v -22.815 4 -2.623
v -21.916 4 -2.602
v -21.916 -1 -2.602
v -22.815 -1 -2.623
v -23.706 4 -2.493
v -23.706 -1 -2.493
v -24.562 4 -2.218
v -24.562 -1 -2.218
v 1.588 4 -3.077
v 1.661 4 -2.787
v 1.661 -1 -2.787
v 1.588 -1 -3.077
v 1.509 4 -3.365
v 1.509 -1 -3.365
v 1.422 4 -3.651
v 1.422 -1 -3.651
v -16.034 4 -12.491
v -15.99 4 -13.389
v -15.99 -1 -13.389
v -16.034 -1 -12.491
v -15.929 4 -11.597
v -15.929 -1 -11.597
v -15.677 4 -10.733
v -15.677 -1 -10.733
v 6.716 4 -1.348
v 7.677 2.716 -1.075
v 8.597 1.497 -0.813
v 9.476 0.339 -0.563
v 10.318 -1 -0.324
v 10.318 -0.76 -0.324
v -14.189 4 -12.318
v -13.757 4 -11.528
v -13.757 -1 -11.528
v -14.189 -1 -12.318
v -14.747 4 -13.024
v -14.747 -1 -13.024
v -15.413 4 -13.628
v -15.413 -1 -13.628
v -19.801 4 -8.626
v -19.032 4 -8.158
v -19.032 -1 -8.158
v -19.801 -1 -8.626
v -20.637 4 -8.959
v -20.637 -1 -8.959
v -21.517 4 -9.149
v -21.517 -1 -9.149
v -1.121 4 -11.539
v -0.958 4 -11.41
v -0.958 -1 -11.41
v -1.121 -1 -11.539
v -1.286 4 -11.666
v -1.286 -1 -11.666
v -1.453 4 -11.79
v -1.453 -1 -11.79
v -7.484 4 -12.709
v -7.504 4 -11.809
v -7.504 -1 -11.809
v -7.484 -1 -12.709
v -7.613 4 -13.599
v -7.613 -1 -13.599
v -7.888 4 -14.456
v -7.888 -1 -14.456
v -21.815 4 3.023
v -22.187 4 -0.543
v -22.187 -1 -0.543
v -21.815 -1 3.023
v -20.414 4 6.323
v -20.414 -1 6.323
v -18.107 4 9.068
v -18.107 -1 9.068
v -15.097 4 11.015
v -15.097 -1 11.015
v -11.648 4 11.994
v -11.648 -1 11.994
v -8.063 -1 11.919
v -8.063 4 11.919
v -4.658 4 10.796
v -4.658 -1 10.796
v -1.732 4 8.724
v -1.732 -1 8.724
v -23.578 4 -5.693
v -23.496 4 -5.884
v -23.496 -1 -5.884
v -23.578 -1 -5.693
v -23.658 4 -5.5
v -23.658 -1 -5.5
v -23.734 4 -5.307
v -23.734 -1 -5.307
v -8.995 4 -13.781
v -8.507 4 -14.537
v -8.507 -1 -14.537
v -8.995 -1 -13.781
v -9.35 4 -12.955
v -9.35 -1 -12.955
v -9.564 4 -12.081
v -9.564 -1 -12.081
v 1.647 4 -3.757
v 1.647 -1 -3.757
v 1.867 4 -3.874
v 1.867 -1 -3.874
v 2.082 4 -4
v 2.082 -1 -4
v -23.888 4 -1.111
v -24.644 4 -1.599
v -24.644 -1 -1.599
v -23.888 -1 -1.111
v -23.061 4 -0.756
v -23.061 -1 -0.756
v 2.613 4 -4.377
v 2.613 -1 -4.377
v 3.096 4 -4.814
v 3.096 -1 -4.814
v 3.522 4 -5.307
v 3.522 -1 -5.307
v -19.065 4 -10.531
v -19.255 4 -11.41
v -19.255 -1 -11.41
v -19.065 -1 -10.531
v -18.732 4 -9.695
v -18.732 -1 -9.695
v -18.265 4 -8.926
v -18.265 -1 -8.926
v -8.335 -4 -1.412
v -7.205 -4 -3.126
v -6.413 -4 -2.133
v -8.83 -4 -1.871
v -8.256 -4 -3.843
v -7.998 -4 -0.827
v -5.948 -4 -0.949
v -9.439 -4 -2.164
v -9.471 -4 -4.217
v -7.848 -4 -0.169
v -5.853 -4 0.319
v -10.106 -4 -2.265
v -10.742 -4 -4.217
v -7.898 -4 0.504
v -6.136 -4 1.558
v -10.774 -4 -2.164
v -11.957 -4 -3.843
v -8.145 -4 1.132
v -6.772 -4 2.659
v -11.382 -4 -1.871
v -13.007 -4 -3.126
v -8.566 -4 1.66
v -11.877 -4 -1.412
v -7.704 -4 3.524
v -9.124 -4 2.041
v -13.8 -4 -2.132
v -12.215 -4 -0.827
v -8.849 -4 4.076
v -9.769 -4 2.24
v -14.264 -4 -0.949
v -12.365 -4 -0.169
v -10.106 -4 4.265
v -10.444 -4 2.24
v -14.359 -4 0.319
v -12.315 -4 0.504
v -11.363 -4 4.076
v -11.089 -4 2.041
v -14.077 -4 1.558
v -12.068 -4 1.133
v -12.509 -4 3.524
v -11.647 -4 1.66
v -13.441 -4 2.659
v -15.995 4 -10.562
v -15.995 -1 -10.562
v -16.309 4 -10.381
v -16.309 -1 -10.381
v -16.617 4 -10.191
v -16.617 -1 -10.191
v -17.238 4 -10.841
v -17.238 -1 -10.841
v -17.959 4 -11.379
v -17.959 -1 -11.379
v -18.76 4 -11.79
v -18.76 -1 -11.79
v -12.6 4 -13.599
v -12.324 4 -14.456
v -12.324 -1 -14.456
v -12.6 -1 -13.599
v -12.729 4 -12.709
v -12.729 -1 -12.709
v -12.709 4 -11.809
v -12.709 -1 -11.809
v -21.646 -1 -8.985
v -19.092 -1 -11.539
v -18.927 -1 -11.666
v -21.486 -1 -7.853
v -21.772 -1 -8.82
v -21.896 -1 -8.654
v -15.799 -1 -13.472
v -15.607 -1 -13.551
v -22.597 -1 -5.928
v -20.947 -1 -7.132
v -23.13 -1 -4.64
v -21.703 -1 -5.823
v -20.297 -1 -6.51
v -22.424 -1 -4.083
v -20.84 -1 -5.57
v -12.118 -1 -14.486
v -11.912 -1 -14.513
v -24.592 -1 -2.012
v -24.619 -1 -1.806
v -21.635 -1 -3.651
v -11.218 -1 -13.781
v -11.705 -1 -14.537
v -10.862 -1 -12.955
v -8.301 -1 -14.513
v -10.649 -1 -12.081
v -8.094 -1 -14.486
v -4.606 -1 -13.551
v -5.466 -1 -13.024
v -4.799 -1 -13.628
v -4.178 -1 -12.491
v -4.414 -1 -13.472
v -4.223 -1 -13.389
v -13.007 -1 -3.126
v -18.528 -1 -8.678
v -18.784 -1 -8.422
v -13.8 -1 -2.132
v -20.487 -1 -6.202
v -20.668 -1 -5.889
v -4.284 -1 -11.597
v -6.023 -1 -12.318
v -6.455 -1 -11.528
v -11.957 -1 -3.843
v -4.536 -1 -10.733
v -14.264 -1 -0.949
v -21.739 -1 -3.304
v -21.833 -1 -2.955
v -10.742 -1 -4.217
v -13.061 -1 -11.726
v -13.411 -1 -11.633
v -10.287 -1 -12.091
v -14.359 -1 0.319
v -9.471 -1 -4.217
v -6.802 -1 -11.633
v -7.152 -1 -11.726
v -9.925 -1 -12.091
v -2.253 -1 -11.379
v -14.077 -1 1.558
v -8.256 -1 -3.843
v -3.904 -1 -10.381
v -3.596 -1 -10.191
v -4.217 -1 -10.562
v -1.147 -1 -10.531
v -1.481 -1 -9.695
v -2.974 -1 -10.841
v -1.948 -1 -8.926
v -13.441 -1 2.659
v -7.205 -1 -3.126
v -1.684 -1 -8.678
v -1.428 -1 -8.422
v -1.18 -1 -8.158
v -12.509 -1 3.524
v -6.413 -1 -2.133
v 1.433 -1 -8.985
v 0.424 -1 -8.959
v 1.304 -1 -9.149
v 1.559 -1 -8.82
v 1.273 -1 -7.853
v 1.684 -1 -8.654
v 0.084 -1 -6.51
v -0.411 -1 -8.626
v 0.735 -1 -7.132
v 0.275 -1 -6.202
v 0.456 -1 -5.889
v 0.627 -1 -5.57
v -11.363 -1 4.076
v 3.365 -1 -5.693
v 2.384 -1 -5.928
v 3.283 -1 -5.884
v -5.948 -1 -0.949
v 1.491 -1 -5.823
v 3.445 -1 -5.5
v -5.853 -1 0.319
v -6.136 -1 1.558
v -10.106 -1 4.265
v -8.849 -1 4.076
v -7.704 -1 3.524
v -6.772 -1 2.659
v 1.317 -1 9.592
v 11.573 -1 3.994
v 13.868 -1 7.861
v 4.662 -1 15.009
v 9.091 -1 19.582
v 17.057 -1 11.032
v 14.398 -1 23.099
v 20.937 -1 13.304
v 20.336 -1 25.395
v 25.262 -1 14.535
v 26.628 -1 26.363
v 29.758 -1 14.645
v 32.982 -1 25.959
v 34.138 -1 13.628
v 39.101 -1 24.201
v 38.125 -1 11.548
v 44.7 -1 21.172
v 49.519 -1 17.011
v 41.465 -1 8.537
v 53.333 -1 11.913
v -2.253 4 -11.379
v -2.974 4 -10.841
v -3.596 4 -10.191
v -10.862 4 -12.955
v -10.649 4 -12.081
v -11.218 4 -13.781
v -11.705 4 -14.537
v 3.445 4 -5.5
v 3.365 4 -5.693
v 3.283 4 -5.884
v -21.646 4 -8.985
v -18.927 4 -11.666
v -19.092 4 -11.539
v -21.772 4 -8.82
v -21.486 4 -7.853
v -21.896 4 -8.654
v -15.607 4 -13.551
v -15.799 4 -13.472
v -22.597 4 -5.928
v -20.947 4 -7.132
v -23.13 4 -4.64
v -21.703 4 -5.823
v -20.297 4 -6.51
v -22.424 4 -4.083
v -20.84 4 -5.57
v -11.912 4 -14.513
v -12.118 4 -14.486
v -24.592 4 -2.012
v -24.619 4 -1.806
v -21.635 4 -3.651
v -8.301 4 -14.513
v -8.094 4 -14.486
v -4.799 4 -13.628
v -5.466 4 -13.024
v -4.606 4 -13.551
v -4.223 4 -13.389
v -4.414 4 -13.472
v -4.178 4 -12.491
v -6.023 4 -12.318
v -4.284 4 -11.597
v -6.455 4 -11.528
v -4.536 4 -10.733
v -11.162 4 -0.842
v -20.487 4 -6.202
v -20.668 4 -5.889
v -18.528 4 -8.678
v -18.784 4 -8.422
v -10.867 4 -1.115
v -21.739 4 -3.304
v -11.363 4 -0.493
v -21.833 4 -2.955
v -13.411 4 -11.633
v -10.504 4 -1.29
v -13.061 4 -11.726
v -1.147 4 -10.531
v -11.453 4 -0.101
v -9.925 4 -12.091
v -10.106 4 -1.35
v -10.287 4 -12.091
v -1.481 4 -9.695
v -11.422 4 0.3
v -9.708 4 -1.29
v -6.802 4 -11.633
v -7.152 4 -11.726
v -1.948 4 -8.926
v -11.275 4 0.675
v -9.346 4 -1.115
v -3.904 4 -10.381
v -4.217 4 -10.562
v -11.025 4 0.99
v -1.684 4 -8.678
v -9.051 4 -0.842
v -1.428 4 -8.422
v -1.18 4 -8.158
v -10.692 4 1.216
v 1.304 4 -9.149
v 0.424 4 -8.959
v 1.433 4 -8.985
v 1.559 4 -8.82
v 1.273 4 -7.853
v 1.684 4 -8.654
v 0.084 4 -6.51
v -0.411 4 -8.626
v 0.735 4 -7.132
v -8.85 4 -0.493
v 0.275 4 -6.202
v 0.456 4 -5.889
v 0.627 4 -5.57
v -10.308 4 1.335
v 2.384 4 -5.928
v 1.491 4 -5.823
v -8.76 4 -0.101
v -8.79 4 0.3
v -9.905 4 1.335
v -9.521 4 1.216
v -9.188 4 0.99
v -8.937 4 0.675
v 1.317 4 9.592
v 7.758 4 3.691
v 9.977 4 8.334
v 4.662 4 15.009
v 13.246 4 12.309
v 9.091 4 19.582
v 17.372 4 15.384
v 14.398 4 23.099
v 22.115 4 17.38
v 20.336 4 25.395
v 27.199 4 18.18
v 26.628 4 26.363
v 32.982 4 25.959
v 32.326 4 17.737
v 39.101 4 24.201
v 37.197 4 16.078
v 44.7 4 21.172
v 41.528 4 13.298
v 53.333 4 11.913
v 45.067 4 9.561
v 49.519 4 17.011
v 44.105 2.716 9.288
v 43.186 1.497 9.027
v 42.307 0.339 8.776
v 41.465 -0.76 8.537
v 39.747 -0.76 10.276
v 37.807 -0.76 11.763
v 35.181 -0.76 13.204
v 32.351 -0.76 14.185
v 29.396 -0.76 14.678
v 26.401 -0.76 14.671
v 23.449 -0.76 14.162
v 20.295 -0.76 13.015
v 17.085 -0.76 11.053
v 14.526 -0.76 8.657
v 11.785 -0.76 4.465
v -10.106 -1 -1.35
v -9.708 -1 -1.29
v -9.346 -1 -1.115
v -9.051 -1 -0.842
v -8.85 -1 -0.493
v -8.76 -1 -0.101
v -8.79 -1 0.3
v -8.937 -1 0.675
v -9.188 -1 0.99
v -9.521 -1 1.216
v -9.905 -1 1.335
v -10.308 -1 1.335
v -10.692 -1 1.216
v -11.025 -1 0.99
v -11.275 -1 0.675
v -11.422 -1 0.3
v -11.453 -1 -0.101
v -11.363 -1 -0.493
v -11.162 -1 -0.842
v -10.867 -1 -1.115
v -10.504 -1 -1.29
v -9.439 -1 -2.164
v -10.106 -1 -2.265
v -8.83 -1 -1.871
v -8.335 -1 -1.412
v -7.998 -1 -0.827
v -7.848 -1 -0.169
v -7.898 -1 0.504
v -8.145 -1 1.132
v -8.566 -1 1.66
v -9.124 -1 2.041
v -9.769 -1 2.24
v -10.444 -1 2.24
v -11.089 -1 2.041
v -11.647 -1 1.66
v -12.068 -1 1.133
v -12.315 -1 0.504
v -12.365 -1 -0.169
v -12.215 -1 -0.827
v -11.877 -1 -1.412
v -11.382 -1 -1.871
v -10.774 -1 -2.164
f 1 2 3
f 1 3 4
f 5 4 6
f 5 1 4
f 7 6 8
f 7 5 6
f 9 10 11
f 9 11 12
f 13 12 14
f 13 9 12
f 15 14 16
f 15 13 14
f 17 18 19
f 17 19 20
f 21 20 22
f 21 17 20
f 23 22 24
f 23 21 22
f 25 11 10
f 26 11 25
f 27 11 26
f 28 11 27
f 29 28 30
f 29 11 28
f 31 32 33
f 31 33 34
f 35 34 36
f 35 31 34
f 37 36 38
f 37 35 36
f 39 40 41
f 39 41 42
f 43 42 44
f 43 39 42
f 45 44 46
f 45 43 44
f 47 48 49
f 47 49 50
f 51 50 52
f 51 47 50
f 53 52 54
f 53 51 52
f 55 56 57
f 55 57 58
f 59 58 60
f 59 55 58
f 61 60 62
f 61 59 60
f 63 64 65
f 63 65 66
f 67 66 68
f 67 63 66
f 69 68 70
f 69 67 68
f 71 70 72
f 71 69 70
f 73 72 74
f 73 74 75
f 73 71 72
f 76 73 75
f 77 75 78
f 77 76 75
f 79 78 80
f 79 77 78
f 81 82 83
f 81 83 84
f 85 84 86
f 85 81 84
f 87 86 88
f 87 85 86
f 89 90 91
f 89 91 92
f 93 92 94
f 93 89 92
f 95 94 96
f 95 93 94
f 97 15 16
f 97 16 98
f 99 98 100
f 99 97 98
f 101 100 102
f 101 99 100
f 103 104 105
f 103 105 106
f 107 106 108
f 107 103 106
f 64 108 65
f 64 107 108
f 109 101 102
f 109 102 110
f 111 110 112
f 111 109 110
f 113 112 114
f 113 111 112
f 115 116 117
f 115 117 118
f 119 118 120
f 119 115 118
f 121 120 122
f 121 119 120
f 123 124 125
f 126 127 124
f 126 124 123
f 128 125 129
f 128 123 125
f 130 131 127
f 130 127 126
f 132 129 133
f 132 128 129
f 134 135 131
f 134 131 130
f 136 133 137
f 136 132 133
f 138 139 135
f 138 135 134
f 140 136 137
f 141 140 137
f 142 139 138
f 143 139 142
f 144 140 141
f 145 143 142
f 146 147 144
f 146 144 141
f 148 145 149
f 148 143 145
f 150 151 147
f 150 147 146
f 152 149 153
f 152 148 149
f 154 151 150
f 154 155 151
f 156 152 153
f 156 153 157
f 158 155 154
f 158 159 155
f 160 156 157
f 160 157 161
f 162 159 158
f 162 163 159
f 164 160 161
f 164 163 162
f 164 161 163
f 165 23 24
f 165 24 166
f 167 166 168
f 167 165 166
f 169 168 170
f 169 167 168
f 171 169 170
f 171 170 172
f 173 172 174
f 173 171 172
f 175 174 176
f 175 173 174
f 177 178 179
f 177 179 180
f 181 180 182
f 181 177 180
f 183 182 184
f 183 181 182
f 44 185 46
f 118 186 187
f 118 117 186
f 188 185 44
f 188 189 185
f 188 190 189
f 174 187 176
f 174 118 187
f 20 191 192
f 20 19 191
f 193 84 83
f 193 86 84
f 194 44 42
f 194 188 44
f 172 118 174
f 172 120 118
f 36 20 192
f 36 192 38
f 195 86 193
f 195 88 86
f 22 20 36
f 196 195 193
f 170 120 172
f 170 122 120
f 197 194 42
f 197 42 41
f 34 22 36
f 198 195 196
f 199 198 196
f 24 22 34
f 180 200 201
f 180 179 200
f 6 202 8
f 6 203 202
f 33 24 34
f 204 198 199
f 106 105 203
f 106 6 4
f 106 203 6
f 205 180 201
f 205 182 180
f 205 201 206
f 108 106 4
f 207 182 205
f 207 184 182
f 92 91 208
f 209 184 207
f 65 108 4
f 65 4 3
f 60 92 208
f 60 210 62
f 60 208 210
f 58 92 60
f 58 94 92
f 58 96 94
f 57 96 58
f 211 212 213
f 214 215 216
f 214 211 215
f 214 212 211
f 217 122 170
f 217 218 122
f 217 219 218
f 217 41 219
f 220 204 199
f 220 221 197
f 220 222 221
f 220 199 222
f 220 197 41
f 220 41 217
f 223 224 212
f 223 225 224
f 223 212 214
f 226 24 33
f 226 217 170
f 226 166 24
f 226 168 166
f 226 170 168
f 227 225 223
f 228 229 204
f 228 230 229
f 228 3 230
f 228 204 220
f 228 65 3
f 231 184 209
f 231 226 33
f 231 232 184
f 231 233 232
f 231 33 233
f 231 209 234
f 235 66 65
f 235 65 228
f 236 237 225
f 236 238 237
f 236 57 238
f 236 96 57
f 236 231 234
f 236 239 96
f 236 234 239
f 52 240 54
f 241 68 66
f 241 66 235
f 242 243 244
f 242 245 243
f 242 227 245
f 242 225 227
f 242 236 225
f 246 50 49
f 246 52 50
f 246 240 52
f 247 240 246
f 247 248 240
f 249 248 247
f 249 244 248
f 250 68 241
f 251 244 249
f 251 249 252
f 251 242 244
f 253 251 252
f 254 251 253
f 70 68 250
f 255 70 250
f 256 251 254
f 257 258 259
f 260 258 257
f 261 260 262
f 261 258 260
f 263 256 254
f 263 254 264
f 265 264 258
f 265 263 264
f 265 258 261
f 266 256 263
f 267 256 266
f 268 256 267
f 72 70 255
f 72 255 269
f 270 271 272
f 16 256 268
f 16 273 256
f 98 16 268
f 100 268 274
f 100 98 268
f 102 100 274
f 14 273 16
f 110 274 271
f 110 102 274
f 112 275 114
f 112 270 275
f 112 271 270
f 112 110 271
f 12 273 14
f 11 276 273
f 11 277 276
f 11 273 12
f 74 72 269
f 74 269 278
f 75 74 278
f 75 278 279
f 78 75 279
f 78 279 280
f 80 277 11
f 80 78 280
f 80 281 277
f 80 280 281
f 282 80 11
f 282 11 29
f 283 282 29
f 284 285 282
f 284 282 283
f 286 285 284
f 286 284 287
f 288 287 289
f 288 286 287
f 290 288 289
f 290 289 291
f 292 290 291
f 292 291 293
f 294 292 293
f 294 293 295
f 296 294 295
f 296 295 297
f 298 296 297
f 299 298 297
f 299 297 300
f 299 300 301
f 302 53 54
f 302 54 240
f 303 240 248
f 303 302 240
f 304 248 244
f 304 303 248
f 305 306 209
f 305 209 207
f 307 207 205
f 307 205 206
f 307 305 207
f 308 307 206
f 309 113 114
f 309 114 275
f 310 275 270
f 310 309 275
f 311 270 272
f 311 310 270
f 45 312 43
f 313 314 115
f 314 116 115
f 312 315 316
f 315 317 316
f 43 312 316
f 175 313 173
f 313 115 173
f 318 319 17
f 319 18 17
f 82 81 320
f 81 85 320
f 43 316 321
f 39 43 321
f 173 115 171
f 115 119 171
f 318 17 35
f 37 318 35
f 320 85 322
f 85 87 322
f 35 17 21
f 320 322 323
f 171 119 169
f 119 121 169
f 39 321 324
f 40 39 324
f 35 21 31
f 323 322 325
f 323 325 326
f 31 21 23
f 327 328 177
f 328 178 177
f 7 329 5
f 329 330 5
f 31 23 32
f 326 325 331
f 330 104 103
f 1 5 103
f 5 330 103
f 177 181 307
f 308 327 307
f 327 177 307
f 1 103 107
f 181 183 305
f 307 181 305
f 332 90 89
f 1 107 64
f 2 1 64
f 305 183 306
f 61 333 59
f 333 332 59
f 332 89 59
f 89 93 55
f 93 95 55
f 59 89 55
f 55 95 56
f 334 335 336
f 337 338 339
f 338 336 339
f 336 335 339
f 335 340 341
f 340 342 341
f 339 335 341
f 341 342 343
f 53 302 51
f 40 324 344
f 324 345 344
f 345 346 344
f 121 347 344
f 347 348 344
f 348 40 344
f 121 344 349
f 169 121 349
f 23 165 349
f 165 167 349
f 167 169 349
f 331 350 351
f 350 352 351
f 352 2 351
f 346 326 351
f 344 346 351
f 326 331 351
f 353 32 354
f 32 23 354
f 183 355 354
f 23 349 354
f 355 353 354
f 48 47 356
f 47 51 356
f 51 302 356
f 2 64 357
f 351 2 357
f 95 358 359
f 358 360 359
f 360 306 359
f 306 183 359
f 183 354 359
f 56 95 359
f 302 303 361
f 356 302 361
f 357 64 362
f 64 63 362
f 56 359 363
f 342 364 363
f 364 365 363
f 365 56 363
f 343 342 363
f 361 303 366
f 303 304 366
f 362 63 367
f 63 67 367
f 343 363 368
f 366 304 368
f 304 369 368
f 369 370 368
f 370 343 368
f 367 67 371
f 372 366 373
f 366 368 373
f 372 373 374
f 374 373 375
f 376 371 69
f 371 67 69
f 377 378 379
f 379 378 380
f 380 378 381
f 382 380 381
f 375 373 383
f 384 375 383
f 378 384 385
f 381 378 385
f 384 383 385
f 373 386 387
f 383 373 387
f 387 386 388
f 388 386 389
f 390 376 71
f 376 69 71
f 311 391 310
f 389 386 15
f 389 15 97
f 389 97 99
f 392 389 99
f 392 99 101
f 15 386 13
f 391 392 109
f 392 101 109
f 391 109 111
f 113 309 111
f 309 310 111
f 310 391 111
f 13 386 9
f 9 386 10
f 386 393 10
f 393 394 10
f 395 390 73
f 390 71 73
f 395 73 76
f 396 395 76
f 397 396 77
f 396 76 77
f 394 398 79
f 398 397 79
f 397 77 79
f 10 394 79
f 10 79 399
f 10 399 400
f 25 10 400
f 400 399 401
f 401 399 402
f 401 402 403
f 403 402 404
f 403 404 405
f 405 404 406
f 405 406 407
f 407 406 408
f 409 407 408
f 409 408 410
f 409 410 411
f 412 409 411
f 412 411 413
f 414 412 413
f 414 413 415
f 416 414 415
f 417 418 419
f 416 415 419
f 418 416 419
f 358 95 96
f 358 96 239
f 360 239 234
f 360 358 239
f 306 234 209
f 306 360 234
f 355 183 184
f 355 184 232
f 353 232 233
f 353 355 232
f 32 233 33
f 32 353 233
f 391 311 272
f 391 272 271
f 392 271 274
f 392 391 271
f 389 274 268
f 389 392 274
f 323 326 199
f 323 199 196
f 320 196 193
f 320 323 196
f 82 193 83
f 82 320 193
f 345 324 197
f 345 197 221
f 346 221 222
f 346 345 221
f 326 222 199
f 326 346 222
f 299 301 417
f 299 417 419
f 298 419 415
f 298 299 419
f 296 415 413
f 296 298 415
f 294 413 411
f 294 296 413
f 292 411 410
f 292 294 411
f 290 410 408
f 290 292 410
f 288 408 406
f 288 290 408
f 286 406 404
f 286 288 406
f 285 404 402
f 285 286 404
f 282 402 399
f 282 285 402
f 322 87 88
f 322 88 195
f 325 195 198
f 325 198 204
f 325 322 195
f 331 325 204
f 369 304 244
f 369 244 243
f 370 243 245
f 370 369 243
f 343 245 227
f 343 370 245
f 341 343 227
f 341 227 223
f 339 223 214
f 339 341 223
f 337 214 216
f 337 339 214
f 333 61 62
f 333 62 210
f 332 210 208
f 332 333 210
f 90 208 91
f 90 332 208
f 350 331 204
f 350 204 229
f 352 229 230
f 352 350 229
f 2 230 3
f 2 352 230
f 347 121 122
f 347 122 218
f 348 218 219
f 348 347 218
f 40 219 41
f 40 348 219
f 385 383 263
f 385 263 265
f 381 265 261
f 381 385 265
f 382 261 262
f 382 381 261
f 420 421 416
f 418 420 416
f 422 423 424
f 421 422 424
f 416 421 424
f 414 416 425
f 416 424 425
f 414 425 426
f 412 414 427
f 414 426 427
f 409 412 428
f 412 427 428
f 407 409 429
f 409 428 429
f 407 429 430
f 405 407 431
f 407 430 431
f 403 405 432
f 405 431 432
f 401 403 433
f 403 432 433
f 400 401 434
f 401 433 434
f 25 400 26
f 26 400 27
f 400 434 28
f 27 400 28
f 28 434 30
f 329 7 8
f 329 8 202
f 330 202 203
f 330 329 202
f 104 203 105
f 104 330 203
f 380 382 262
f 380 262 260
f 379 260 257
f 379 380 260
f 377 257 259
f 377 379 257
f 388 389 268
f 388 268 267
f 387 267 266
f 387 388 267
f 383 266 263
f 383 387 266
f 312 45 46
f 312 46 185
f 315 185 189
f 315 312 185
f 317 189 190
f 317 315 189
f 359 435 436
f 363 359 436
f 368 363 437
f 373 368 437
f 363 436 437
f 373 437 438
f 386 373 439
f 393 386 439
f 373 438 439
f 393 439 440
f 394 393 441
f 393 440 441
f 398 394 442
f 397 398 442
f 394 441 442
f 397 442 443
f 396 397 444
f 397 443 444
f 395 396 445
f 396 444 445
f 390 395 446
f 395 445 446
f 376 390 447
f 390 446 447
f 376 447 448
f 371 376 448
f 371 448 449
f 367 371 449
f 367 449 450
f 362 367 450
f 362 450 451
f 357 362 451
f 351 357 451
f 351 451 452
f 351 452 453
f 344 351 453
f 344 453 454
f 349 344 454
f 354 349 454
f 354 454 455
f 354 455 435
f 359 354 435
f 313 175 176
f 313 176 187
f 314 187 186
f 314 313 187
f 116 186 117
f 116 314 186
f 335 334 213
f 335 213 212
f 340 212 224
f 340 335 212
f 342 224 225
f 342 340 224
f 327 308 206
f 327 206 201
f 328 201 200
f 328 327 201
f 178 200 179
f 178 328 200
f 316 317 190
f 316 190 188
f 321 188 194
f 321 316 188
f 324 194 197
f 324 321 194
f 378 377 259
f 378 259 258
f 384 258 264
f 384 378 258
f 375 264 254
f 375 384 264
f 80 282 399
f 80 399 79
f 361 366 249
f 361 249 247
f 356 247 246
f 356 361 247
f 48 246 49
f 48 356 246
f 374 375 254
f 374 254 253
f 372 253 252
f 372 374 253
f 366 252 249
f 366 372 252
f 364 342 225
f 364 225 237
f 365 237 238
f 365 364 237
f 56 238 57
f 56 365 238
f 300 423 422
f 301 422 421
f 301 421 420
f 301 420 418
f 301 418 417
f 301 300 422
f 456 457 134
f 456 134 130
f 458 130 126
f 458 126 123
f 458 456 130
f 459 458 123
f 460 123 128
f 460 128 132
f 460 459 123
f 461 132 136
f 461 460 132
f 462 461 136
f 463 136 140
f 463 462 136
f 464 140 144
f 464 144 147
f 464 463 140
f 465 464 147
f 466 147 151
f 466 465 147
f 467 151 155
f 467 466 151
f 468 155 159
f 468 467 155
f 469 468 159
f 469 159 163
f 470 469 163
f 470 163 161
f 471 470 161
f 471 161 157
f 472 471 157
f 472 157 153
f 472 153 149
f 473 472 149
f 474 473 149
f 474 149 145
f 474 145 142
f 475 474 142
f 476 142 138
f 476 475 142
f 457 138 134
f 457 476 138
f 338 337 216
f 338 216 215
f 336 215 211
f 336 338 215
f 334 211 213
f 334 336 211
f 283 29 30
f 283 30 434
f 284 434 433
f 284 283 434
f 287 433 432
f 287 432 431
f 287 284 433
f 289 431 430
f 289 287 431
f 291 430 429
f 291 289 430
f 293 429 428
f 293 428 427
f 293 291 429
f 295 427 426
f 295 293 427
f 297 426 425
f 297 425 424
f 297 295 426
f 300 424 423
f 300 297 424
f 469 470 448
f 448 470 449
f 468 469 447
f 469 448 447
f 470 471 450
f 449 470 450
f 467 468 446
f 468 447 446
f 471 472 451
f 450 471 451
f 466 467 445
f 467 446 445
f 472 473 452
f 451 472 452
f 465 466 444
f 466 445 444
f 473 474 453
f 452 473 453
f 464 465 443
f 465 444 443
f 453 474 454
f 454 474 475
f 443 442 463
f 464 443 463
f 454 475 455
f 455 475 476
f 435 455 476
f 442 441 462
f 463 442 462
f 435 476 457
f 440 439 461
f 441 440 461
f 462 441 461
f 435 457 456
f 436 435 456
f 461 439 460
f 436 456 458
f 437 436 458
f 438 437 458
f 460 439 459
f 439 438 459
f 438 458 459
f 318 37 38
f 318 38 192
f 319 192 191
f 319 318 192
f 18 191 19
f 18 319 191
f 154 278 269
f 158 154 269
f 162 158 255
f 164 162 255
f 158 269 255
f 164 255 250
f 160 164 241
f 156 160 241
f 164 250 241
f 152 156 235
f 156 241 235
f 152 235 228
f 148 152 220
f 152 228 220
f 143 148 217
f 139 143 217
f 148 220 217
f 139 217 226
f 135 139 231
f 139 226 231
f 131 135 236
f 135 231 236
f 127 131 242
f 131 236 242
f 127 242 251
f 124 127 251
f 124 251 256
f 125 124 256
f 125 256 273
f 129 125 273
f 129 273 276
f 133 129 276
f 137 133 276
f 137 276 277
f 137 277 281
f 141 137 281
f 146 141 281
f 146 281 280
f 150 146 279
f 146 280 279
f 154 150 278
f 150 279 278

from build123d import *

# Parameters (mm, degrees)
BOSS_EXTRUDE1_DEPTH = 5
SKETCH_1_R          = 1.35
CUT_EXTRUDE_1_DEPTH = 30.045539702
SKETCH_2_R          = 4.265
SKETCH_2_R_2        = 2.265
EXTRUDE_1_DEPTH     = 3
EXTRUDE_2_DEPTH     = 5


with BuildPart() as part:
    # Sketch1 → Boss-Extrude1 (new body)
    with BuildSketch(Plane(origin=(0, 4, 0), x_dir=(1, 0, 0), z_dir=(0, 1, 0))):
        with BuildLine():
            ThreePointArc((-24.562186363, 2.217928037), (-24.606223651, 1.908945561), (-24.643657446, 1.599093719))
            ThreePointArc((-24.643657446, 1.599093719), (-23.481710119, 0.916420874), (-22.186907731, 0.542722358))
            ThreePointArc((-22.186907731, 0.542722358), (-12.402167869, -11.872817218), (1.305695063, -4))
            ThreePointArc((1.305695063, -4), (1.985007572, -0.183996455), (1.422120465, 3.650909885))
            ThreePointArc((1.422120465, 3.650909885), (1.757918397, 3.814049117), (2.081641936, 4))
            ThreePointArc((2.081641936, 4), (2.861028333, 4.588201733), (3.521749436, 5.30713988))
            ThreePointArc((3.521749436, 5.30713988), (3.405395609, 5.596745198), (3.282888305, 5.883801663))
            ThreePointArc((3.282888305, 5.883801663), (1.93527598, 5.894040025), (0.627094961, 5.57027124))
            ThreePointArc((0.627094961, 5.57027124), (0.366286148, 6.046375), (0.084372603, 6.510293938))
            ThreePointArc((0.084372603, 6.510293938), (1.018855105, 7.48132754), (1.683794586, 8.65351323))
            ThreePointArc((1.683794586, 8.65351323), (1.496450048, 8.903135899), (1.303821399, 9.148703928))
            ThreePointArc((1.303821399, 9.148703928), (-0.000522033, 8.809805691), (-1.180330337, 8.158486898))
            ThreePointArc((-1.180330337, 8.158486898), (-1.555477026, 8.550865528), (-1.947855656, 8.926012217))
            ThreePointArc((-1.947855656, 8.926012217), (-1.296536862, 10.105820521), (-0.957638625, 11.410163953))
            ThreePointArc((-0.957638625, 11.410163953), (-1.203206655, 11.602792602), (-1.452829324, 11.79013714))
            ThreePointArc((-1.452829324, 11.79013714), (-2.625015014, 11.125197659), (-3.596048616, 10.190715157))
            ThreePointArc((-3.596048616, 10.190715157), (-4.059967554, 10.472628702), (-4.536071314, 10.733437515))
            ThreePointArc((-4.536071314, 10.733437515), (-4.212302529, 12.041618533), (-4.222540891, 13.389230859))
            ThreePointArc((-4.222540891, 13.389230859), (-4.509597355, 13.511738163), (-4.799202674, 13.62809199))
            ThreePointArc((-4.799202674, 13.62809199), (-5.759348103, 12.682425791), (-6.455432668, 11.528463019))
            ThreePointArc((-6.455432668, 11.528463019), (-6.976508546, 11.680699536), (-7.503891752, 11.809396783))
            ThreePointArc((-7.503891752, 11.809396783), (-7.529737283, 13.156800143), (-7.888414517, 14.455843809))
            ThreePointArc((-7.888414517, 14.455843809), (-8.197396993, 14.499881098), (-8.507248835, 14.537314892))
            ThreePointArc((-8.507248835, 14.537314892), (-9.18992168, 13.375367565), (-9.563620196, 12.080565177))
            ThreePointArc((-9.563620196, 12.080565177), (-10.106342554, 12.09275), (-10.649064912, 12.080565177))
            ThreePointArc((-10.649064912, 12.080565177), (-11.022763428, 13.375367565), (-11.705436272, 14.537314892))
            ThreePointArc((-11.705436272, 14.537314892), (-12.015288115, 14.499881098), (-12.324270591, 14.455843809))
            ThreePointArc((-12.324270591, 14.455843809), (-12.682947825, 13.156800143), (-12.708793355, 11.809396783))
            ThreePointArc((-12.708793355, 11.809396783), (-13.236176561, 11.680699536), (-13.757252439, 11.528463019))
            ThreePointArc((-13.757252439, 11.528463019), (-14.453337005, 12.682425791), (-15.413482434, 13.62809199))
            ThreePointArc((-15.413482434, 13.62809199), (-15.703087752, 13.511738163), (-15.990144217, 13.389230859))
            ThreePointArc((-15.990144217, 13.389230859), (-16.000382579, 12.041618533), (-15.676613793, 10.733437515))
            ThreePointArc((-15.676613793, 10.733437515), (-16.152717554, 10.472628702), (-16.616636492, 10.190715157))
            ThreePointArc((-16.616636492, 10.190715157), (-17.587670094, 11.125197659), (-18.759855783, 11.79013714))
            ThreePointArc((-18.759855783, 11.79013714), (-19.009478453, 11.602792602), (-19.255046482, 11.410163953))
            ThreePointArc((-19.255046482, 11.410163953), (-18.916148245, 10.105820521), (-18.264829452, 8.926012217))
            ThreePointArc((-18.264829452, 8.926012217), (-18.657208082, 8.550865528), (-19.032354771, 8.158486898))
            ThreePointArc((-19.032354771, 8.158486898), (-20.212163074, 8.809805691), (-21.516506507, 9.148703928))
            ThreePointArc((-21.516506507, 9.148703928), (-21.709135156, 8.903135899), (-21.896479694, 8.65351323))
            ThreePointArc((-21.896479694, 8.65351323), (-21.231540213, 7.48132754), (-20.297057711, 6.510293938))
            ThreePointArc((-20.297057711, 6.510293938), (-20.578971255, 6.046375), (-20.839780068, 5.57027124))
            ThreePointArc((-20.839780068, 5.57027124), (-22.147961087, 5.894040025), (-23.495573413, 5.883801663))
            ThreePointArc((-23.495573413, 5.883801663), (-23.618080717, 5.596745198), (-23.734434544, 5.30713988))
            ThreePointArc((-23.734434544, 5.30713988), (-22.788768345, 4.346994451), (-21.634805572, 3.650909885))
            ThreePointArc((-21.634805572, 3.650909885), (-21.78704209, 3.129834008), (-21.915739337, 2.602450802))
            ThreePointArc((-21.915739337, 2.602450802), (-23.263142697, 2.576605271), (-24.562186363, 2.217928037))
        make_face()
    extrude(amount=-BOSS_EXTRUDE1_DEPTH)

    # 草图1 → 切除-拉伸1 (cut, through all)
    with BuildSketch(Plane.XZ.offset(1)):
        with Locations(Location((-10.106342554, 0, 0), (0, 0, 270))):
            Circle(SKETCH_1_R)
    extrude(amount=-CUT_EXTRUDE_1_DEPTH, mode=Mode.SUBTRACT)

    # 草图2 → 凸台-拉伸1 (add)
    with BuildSketch(Plane.XZ.offset(1)):
        with Locations(Location((-10.106342554, 0, 0), (0, 0, 90))):
            Circle(SKETCH_2_R)
        with Locations(Location((-10.106342554, 0, 0), (0, 0, 270))):
            Circle(SKETCH_2_R_2, mode=Mode.SUBTRACT)
    extrude(amount=EXTRUDE_1_DEPTH)

    # 草图3 → 凸台-拉伸2 (add)
    with BuildSketch(Plane.XZ.offset(1)):
        with BuildLine():
            Line((1.316832407, 9.59169813), (-1.732440783, 8.724240465))
            Line((-1.732440783, 8.724240465), (1.660979616, -2.786526782))
            Line((1.660979616, -2.786526782), (10.317511543, -0.323915364))
            ThreePointArc((10.317511543, -0.323915364), (23.060971172, 14.056333138), (41.465450985, 8.537054824))
            Line((41.465450985, 8.537054824), (53.333346557, 11.913235424))
            ThreePointArc((53.333346557, 11.913235424), (26.628358933, 26.363456331), (1.316832407, 9.59169813))
        make_face()
    extrude(amount=-EXTRUDE_2_DEPTH)

    # 草图5 → 切除-旋转1 (revolve, cut)
    with BuildSketch(Plane(origin=(8.606089679, 0, -14.547237495), x_dir=(-0.8606674274779063, 0, -0.5091675355701334), z_dir=(0.5091675355701334, 0, -0.8606674274779063))):
        Polygon((-43.768106901, 4), (-39.968106901, -1.23415978), (-39.968106901, 4), align=None)
    revolve(axis=Axis((27.943657446, -0.047851862, -3.107206875), (0, -1, 0)), mode=Mode.SUBTRACT)


solid = part.part
